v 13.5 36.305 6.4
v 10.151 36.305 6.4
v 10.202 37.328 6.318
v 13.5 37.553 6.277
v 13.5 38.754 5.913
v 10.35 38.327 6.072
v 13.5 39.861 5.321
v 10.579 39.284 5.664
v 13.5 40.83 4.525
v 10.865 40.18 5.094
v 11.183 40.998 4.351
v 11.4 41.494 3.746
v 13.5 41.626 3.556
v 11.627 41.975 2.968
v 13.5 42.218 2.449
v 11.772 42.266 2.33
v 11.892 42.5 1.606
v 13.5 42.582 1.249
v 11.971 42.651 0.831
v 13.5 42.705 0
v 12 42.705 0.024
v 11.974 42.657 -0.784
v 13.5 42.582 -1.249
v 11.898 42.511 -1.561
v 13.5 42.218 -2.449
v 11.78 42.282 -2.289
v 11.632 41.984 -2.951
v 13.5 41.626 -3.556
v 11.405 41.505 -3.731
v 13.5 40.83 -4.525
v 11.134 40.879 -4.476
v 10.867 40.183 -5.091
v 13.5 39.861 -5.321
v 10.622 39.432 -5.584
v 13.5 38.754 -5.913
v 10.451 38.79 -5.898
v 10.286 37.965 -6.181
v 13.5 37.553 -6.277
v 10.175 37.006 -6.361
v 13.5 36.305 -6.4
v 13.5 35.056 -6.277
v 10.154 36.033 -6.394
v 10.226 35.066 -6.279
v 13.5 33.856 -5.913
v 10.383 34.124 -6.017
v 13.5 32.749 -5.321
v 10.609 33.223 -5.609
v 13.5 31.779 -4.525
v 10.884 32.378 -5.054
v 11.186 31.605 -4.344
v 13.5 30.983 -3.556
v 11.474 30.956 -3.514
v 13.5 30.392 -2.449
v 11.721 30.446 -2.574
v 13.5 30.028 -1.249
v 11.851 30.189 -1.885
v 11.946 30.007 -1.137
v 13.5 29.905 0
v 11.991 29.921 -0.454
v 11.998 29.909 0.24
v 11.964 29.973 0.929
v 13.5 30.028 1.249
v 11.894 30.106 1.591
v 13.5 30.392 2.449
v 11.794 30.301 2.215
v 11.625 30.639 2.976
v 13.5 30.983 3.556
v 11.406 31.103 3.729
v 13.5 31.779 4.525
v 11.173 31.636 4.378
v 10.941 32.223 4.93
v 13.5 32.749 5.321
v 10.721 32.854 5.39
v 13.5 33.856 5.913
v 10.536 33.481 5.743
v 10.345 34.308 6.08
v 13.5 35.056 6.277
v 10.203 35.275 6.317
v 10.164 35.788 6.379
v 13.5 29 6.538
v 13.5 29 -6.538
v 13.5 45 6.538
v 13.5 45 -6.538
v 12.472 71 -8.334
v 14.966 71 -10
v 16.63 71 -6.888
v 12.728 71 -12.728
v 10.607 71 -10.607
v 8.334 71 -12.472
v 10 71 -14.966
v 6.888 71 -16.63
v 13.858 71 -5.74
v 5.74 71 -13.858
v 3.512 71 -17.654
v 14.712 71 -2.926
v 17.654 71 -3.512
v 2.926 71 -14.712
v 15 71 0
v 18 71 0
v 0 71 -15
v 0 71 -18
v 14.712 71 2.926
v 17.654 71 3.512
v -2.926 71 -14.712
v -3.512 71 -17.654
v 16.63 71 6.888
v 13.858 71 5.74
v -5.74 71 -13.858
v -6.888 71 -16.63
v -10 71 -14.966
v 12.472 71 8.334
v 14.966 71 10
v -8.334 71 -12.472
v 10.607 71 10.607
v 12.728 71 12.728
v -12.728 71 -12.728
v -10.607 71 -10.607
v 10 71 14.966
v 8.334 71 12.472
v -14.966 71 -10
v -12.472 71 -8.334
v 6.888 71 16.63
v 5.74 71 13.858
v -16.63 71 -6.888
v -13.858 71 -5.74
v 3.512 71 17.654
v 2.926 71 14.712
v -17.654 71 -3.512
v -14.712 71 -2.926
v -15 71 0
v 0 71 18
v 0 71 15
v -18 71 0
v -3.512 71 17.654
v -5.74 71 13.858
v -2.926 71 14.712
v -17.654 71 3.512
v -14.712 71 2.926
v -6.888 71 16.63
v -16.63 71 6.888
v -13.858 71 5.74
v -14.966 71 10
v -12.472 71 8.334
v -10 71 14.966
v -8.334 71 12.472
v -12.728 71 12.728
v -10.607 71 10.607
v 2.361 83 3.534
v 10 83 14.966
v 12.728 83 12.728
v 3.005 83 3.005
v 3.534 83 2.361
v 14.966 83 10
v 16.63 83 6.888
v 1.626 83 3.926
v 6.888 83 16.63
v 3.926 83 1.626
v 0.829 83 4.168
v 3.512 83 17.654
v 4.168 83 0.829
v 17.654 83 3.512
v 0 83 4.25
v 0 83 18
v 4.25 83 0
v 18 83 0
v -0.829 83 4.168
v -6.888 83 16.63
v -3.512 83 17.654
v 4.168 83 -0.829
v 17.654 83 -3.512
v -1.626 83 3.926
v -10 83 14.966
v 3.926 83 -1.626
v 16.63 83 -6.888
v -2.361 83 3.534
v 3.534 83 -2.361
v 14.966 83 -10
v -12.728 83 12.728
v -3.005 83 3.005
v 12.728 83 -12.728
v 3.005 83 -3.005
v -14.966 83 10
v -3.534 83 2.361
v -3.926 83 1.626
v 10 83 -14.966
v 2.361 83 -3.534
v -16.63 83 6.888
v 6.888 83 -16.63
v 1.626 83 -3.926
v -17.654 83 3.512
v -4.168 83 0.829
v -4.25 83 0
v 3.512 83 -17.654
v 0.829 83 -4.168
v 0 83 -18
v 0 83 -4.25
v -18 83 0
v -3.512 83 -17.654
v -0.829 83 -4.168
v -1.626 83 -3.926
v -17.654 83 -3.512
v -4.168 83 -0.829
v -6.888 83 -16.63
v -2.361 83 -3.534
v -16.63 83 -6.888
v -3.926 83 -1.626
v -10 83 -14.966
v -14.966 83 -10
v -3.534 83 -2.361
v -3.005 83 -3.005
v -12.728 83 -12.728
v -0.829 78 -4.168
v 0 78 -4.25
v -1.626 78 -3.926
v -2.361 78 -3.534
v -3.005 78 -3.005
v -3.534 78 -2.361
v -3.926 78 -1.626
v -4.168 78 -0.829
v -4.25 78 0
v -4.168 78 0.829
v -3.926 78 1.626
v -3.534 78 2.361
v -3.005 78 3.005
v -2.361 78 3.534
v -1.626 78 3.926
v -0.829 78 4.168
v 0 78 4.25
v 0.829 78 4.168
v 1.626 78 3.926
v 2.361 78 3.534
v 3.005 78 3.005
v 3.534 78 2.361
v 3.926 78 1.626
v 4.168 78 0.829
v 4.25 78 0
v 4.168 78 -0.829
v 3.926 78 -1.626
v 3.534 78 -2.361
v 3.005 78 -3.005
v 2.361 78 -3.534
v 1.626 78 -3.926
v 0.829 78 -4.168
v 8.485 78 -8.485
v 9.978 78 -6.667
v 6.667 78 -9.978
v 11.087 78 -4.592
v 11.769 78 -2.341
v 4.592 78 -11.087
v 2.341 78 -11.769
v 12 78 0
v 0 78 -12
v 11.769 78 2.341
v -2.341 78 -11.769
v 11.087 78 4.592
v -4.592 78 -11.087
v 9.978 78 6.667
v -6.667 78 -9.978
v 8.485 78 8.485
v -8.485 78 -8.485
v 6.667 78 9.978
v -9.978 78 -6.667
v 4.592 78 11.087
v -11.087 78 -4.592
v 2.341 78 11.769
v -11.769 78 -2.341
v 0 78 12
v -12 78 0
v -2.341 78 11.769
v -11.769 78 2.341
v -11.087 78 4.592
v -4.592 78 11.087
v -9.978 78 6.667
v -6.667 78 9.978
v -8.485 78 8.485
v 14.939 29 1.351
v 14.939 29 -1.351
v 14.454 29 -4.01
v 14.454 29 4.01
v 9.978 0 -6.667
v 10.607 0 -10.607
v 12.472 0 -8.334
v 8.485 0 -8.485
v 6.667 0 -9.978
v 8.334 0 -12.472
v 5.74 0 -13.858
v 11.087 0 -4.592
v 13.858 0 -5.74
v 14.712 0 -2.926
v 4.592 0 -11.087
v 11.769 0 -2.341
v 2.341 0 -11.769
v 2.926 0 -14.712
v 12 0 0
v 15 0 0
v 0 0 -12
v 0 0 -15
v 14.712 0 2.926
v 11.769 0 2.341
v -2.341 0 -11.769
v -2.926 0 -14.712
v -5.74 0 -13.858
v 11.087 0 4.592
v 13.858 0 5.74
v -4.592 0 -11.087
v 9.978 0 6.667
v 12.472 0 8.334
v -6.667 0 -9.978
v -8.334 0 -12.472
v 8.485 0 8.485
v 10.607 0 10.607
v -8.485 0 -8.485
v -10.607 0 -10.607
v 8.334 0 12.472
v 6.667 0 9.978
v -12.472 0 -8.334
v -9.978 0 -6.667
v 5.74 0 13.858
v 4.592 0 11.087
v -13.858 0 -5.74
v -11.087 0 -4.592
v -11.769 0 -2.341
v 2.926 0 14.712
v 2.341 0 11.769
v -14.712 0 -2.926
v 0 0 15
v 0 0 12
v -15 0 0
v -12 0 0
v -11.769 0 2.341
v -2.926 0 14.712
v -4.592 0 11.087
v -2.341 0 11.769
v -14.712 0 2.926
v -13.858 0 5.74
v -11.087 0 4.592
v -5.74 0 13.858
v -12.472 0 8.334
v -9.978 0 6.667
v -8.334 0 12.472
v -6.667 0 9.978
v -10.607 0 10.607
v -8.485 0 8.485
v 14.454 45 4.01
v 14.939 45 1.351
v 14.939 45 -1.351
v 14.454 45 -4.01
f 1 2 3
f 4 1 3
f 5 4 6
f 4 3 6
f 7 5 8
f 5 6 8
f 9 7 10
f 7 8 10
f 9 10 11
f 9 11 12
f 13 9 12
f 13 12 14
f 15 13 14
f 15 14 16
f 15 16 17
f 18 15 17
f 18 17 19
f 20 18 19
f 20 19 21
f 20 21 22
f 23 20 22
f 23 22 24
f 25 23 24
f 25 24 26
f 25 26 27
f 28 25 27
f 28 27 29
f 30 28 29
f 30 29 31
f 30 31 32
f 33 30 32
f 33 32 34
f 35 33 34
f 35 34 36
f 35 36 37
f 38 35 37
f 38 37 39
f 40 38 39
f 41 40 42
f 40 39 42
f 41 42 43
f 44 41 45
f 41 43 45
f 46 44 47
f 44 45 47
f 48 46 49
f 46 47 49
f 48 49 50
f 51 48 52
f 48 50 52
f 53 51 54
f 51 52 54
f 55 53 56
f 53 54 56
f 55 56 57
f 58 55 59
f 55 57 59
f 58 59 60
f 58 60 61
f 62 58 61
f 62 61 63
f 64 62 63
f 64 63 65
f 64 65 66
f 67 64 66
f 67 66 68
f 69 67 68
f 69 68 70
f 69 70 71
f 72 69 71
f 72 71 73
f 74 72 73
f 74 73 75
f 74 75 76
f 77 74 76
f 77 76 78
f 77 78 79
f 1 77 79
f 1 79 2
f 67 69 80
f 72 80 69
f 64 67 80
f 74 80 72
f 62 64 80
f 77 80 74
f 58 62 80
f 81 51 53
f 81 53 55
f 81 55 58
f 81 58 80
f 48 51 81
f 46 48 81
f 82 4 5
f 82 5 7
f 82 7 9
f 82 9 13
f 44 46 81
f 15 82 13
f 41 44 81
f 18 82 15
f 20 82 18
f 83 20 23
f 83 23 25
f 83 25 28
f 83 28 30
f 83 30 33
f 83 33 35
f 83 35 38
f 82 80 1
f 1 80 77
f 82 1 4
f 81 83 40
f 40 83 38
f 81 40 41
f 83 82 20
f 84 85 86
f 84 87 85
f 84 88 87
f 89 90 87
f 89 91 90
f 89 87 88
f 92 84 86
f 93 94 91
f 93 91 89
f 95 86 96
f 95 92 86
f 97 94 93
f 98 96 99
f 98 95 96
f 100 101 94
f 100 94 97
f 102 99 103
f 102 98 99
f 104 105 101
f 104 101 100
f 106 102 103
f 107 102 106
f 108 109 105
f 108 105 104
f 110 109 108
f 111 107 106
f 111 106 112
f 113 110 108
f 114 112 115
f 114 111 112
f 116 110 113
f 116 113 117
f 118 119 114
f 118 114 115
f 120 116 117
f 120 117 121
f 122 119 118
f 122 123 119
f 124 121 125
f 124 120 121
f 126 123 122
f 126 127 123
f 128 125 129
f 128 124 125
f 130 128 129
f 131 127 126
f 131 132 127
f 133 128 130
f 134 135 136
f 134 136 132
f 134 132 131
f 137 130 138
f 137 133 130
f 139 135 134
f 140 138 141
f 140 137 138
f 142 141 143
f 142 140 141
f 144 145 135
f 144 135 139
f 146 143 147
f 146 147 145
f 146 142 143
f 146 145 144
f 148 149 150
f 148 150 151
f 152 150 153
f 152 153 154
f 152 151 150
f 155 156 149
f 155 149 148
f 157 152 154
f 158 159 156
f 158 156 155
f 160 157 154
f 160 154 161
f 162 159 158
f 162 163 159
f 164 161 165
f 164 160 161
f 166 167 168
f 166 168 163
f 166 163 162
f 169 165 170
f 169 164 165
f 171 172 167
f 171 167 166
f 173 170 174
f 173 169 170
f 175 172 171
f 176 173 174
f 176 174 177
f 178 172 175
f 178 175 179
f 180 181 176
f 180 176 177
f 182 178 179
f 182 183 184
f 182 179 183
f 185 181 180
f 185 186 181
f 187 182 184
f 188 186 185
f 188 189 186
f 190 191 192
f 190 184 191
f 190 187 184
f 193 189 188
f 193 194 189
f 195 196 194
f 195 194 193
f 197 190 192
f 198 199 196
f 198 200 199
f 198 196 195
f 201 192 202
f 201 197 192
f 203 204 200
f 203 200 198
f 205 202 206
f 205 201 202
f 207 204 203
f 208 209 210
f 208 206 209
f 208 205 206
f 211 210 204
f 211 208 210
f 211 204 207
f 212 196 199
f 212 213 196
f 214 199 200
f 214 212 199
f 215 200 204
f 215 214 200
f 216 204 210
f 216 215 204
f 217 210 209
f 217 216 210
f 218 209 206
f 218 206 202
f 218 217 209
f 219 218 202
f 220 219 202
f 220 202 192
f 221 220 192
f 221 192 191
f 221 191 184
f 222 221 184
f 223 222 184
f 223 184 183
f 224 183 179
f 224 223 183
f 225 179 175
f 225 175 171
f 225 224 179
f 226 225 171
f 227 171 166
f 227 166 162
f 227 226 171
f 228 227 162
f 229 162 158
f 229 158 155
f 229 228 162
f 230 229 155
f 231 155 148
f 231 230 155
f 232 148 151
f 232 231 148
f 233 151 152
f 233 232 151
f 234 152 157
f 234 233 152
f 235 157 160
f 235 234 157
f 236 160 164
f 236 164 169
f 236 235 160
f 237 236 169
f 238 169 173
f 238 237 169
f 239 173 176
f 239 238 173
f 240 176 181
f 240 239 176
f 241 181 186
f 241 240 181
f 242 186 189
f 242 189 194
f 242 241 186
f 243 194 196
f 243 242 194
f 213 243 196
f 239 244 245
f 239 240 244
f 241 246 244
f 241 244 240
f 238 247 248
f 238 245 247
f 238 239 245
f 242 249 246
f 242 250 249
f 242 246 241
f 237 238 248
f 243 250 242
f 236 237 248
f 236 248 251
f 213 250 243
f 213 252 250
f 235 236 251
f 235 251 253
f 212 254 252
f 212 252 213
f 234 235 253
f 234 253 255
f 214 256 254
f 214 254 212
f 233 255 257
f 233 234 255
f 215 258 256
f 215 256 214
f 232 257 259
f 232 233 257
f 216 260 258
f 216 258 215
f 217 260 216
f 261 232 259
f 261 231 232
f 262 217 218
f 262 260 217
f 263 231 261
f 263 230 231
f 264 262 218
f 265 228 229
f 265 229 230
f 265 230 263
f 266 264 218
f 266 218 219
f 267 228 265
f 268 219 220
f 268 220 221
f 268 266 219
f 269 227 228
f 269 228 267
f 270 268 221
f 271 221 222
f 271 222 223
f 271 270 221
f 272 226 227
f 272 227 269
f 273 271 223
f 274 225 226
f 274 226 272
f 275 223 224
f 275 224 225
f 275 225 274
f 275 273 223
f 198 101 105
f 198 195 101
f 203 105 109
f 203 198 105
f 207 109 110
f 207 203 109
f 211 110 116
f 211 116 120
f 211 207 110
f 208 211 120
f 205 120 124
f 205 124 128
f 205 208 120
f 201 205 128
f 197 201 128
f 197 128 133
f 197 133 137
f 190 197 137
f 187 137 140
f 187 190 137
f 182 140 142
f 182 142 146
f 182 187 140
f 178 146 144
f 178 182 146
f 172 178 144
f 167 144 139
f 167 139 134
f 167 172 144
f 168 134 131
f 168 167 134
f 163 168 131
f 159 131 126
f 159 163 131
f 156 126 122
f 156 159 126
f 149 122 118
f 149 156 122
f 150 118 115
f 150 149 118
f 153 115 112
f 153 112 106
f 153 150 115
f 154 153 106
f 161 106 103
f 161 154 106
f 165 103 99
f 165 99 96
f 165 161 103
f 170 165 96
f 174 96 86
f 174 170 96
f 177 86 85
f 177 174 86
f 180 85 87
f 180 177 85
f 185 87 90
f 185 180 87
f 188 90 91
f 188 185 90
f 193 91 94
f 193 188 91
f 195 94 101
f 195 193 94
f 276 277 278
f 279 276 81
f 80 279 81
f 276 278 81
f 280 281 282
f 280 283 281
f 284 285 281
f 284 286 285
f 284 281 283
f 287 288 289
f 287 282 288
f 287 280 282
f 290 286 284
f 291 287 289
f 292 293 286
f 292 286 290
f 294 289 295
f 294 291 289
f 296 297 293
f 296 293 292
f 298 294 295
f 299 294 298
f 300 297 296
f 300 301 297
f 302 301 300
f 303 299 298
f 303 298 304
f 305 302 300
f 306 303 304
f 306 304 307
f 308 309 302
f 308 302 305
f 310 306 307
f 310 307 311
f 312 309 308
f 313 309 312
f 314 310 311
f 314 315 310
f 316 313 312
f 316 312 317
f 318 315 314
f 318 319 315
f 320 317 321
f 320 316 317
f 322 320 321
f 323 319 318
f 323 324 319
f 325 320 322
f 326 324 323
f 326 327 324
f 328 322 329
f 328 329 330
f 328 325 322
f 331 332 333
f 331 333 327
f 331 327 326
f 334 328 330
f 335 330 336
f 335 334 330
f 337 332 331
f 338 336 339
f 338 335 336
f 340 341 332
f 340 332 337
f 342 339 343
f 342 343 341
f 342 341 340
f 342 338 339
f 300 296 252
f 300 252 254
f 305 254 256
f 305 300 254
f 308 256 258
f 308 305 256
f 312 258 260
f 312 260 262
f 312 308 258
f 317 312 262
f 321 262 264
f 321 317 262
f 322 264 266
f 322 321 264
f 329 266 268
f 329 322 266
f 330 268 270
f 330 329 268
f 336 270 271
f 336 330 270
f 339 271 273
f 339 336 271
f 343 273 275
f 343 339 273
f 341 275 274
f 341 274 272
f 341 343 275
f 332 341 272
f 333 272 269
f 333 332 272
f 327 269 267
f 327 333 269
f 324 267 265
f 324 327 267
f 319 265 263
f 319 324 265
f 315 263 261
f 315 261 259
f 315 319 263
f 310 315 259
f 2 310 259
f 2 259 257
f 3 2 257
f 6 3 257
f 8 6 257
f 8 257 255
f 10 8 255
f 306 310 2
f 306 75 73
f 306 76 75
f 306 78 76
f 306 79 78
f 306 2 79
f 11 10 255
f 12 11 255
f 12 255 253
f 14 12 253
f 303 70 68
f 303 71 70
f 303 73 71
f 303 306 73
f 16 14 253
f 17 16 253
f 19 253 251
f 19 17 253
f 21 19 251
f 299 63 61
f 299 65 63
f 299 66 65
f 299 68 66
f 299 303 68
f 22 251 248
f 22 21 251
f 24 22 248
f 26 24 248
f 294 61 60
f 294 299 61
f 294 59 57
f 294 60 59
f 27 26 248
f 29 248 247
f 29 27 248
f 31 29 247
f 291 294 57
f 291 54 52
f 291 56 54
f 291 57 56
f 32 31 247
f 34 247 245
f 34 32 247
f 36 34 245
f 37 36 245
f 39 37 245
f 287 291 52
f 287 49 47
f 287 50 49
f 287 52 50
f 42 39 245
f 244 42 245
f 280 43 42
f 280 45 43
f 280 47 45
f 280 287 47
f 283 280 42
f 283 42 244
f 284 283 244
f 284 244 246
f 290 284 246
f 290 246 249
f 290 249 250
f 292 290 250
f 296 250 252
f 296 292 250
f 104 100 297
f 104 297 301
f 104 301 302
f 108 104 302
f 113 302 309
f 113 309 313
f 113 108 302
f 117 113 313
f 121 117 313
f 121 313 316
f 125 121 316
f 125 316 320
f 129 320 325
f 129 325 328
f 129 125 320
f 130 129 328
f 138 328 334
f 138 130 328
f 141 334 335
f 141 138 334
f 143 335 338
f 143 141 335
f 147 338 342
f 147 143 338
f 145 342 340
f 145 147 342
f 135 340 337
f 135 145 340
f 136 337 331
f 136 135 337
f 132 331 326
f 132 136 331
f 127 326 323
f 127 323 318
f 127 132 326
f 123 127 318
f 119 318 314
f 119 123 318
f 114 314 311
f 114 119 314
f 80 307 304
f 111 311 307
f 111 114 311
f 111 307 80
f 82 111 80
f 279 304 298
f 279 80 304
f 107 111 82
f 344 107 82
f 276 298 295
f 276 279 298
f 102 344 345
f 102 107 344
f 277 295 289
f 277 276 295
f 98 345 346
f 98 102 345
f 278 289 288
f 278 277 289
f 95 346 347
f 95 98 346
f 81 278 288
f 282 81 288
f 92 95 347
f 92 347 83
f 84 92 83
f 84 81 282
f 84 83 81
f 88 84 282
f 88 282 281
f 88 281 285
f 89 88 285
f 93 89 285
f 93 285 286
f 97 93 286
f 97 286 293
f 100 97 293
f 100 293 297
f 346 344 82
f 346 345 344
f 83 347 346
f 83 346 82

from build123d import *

# Parameters (mm, degrees)
TAGLIO_ESTRUSIONE1_START = 15
SCHIZZO2_W               = 16
SCHIZZO2_H               = 16
TAGLIO_ESTRUSIONE1_DEPTH = 1.5
FORO_12_8_12_8_1_D       = 12.8
FORO_12_8_12_8_1_DEPTH   = 15.154492038
FORO_12_8_12_8_1_TIP     = 3.845507962


with BuildPart() as part:
    # Schizzo1 → Rivoluzione1 (revolve)
    with BuildSketch(Plane.XY, mode=Mode.PRIVATE) as rivoluzione1_sk:
        Polygon((-12, 0), (-15, 0), (-15, 71), (-18, 71), (-18, 83), (-4.25, 83), (-4.25, 78), (-12, 78), align=None)
    revolve(rivoluzione1_sk.sketch.rotate(Axis((0, 0, 0), (0, 1, 0)), 270), axis=Axis((0, 0, 0), (0, 1, 0)))

    # Schizzo2 → Taglio-Estrusione1 (cut)
    with BuildSketch(Plane(origin=(0, 0, 0), x_dir=(0, 0, -1), z_dir=(1, 0, 0)).offset(TAGLIO_ESTRUSIONE1_START)):
        with Locations((0, 37)):
            Rectangle(SCHIZZO2_W, SCHIZZO2_H)
    extrude(amount=-TAGLIO_ESTRUSIONE1_DEPTH, mode=Mode.SUBTRACT)

    # Foro Ø12.8 (12.8)-1
    with Locations(Plane(origin=(13.5, 0, 0), x_dir=(0, 0, -1), z_dir=(1, 0, 0))):
        with Locations((0, 36.304872912)):
            Hole(FORO_12_8_12_8_1_D / 2, depth=FORO_12_8_12_8_1_DEPTH)
            with Locations((0, 0, -(FORO_12_8_12_8_1_DEPTH + FORO_12_8_12_8_1_TIP / 2))):  # 118° drill point
                Cone(0, FORO_12_8_12_8_1_D / 2, FORO_12_8_12_8_1_TIP, mode=Mode.SUBTRACT)


solid = part.part
